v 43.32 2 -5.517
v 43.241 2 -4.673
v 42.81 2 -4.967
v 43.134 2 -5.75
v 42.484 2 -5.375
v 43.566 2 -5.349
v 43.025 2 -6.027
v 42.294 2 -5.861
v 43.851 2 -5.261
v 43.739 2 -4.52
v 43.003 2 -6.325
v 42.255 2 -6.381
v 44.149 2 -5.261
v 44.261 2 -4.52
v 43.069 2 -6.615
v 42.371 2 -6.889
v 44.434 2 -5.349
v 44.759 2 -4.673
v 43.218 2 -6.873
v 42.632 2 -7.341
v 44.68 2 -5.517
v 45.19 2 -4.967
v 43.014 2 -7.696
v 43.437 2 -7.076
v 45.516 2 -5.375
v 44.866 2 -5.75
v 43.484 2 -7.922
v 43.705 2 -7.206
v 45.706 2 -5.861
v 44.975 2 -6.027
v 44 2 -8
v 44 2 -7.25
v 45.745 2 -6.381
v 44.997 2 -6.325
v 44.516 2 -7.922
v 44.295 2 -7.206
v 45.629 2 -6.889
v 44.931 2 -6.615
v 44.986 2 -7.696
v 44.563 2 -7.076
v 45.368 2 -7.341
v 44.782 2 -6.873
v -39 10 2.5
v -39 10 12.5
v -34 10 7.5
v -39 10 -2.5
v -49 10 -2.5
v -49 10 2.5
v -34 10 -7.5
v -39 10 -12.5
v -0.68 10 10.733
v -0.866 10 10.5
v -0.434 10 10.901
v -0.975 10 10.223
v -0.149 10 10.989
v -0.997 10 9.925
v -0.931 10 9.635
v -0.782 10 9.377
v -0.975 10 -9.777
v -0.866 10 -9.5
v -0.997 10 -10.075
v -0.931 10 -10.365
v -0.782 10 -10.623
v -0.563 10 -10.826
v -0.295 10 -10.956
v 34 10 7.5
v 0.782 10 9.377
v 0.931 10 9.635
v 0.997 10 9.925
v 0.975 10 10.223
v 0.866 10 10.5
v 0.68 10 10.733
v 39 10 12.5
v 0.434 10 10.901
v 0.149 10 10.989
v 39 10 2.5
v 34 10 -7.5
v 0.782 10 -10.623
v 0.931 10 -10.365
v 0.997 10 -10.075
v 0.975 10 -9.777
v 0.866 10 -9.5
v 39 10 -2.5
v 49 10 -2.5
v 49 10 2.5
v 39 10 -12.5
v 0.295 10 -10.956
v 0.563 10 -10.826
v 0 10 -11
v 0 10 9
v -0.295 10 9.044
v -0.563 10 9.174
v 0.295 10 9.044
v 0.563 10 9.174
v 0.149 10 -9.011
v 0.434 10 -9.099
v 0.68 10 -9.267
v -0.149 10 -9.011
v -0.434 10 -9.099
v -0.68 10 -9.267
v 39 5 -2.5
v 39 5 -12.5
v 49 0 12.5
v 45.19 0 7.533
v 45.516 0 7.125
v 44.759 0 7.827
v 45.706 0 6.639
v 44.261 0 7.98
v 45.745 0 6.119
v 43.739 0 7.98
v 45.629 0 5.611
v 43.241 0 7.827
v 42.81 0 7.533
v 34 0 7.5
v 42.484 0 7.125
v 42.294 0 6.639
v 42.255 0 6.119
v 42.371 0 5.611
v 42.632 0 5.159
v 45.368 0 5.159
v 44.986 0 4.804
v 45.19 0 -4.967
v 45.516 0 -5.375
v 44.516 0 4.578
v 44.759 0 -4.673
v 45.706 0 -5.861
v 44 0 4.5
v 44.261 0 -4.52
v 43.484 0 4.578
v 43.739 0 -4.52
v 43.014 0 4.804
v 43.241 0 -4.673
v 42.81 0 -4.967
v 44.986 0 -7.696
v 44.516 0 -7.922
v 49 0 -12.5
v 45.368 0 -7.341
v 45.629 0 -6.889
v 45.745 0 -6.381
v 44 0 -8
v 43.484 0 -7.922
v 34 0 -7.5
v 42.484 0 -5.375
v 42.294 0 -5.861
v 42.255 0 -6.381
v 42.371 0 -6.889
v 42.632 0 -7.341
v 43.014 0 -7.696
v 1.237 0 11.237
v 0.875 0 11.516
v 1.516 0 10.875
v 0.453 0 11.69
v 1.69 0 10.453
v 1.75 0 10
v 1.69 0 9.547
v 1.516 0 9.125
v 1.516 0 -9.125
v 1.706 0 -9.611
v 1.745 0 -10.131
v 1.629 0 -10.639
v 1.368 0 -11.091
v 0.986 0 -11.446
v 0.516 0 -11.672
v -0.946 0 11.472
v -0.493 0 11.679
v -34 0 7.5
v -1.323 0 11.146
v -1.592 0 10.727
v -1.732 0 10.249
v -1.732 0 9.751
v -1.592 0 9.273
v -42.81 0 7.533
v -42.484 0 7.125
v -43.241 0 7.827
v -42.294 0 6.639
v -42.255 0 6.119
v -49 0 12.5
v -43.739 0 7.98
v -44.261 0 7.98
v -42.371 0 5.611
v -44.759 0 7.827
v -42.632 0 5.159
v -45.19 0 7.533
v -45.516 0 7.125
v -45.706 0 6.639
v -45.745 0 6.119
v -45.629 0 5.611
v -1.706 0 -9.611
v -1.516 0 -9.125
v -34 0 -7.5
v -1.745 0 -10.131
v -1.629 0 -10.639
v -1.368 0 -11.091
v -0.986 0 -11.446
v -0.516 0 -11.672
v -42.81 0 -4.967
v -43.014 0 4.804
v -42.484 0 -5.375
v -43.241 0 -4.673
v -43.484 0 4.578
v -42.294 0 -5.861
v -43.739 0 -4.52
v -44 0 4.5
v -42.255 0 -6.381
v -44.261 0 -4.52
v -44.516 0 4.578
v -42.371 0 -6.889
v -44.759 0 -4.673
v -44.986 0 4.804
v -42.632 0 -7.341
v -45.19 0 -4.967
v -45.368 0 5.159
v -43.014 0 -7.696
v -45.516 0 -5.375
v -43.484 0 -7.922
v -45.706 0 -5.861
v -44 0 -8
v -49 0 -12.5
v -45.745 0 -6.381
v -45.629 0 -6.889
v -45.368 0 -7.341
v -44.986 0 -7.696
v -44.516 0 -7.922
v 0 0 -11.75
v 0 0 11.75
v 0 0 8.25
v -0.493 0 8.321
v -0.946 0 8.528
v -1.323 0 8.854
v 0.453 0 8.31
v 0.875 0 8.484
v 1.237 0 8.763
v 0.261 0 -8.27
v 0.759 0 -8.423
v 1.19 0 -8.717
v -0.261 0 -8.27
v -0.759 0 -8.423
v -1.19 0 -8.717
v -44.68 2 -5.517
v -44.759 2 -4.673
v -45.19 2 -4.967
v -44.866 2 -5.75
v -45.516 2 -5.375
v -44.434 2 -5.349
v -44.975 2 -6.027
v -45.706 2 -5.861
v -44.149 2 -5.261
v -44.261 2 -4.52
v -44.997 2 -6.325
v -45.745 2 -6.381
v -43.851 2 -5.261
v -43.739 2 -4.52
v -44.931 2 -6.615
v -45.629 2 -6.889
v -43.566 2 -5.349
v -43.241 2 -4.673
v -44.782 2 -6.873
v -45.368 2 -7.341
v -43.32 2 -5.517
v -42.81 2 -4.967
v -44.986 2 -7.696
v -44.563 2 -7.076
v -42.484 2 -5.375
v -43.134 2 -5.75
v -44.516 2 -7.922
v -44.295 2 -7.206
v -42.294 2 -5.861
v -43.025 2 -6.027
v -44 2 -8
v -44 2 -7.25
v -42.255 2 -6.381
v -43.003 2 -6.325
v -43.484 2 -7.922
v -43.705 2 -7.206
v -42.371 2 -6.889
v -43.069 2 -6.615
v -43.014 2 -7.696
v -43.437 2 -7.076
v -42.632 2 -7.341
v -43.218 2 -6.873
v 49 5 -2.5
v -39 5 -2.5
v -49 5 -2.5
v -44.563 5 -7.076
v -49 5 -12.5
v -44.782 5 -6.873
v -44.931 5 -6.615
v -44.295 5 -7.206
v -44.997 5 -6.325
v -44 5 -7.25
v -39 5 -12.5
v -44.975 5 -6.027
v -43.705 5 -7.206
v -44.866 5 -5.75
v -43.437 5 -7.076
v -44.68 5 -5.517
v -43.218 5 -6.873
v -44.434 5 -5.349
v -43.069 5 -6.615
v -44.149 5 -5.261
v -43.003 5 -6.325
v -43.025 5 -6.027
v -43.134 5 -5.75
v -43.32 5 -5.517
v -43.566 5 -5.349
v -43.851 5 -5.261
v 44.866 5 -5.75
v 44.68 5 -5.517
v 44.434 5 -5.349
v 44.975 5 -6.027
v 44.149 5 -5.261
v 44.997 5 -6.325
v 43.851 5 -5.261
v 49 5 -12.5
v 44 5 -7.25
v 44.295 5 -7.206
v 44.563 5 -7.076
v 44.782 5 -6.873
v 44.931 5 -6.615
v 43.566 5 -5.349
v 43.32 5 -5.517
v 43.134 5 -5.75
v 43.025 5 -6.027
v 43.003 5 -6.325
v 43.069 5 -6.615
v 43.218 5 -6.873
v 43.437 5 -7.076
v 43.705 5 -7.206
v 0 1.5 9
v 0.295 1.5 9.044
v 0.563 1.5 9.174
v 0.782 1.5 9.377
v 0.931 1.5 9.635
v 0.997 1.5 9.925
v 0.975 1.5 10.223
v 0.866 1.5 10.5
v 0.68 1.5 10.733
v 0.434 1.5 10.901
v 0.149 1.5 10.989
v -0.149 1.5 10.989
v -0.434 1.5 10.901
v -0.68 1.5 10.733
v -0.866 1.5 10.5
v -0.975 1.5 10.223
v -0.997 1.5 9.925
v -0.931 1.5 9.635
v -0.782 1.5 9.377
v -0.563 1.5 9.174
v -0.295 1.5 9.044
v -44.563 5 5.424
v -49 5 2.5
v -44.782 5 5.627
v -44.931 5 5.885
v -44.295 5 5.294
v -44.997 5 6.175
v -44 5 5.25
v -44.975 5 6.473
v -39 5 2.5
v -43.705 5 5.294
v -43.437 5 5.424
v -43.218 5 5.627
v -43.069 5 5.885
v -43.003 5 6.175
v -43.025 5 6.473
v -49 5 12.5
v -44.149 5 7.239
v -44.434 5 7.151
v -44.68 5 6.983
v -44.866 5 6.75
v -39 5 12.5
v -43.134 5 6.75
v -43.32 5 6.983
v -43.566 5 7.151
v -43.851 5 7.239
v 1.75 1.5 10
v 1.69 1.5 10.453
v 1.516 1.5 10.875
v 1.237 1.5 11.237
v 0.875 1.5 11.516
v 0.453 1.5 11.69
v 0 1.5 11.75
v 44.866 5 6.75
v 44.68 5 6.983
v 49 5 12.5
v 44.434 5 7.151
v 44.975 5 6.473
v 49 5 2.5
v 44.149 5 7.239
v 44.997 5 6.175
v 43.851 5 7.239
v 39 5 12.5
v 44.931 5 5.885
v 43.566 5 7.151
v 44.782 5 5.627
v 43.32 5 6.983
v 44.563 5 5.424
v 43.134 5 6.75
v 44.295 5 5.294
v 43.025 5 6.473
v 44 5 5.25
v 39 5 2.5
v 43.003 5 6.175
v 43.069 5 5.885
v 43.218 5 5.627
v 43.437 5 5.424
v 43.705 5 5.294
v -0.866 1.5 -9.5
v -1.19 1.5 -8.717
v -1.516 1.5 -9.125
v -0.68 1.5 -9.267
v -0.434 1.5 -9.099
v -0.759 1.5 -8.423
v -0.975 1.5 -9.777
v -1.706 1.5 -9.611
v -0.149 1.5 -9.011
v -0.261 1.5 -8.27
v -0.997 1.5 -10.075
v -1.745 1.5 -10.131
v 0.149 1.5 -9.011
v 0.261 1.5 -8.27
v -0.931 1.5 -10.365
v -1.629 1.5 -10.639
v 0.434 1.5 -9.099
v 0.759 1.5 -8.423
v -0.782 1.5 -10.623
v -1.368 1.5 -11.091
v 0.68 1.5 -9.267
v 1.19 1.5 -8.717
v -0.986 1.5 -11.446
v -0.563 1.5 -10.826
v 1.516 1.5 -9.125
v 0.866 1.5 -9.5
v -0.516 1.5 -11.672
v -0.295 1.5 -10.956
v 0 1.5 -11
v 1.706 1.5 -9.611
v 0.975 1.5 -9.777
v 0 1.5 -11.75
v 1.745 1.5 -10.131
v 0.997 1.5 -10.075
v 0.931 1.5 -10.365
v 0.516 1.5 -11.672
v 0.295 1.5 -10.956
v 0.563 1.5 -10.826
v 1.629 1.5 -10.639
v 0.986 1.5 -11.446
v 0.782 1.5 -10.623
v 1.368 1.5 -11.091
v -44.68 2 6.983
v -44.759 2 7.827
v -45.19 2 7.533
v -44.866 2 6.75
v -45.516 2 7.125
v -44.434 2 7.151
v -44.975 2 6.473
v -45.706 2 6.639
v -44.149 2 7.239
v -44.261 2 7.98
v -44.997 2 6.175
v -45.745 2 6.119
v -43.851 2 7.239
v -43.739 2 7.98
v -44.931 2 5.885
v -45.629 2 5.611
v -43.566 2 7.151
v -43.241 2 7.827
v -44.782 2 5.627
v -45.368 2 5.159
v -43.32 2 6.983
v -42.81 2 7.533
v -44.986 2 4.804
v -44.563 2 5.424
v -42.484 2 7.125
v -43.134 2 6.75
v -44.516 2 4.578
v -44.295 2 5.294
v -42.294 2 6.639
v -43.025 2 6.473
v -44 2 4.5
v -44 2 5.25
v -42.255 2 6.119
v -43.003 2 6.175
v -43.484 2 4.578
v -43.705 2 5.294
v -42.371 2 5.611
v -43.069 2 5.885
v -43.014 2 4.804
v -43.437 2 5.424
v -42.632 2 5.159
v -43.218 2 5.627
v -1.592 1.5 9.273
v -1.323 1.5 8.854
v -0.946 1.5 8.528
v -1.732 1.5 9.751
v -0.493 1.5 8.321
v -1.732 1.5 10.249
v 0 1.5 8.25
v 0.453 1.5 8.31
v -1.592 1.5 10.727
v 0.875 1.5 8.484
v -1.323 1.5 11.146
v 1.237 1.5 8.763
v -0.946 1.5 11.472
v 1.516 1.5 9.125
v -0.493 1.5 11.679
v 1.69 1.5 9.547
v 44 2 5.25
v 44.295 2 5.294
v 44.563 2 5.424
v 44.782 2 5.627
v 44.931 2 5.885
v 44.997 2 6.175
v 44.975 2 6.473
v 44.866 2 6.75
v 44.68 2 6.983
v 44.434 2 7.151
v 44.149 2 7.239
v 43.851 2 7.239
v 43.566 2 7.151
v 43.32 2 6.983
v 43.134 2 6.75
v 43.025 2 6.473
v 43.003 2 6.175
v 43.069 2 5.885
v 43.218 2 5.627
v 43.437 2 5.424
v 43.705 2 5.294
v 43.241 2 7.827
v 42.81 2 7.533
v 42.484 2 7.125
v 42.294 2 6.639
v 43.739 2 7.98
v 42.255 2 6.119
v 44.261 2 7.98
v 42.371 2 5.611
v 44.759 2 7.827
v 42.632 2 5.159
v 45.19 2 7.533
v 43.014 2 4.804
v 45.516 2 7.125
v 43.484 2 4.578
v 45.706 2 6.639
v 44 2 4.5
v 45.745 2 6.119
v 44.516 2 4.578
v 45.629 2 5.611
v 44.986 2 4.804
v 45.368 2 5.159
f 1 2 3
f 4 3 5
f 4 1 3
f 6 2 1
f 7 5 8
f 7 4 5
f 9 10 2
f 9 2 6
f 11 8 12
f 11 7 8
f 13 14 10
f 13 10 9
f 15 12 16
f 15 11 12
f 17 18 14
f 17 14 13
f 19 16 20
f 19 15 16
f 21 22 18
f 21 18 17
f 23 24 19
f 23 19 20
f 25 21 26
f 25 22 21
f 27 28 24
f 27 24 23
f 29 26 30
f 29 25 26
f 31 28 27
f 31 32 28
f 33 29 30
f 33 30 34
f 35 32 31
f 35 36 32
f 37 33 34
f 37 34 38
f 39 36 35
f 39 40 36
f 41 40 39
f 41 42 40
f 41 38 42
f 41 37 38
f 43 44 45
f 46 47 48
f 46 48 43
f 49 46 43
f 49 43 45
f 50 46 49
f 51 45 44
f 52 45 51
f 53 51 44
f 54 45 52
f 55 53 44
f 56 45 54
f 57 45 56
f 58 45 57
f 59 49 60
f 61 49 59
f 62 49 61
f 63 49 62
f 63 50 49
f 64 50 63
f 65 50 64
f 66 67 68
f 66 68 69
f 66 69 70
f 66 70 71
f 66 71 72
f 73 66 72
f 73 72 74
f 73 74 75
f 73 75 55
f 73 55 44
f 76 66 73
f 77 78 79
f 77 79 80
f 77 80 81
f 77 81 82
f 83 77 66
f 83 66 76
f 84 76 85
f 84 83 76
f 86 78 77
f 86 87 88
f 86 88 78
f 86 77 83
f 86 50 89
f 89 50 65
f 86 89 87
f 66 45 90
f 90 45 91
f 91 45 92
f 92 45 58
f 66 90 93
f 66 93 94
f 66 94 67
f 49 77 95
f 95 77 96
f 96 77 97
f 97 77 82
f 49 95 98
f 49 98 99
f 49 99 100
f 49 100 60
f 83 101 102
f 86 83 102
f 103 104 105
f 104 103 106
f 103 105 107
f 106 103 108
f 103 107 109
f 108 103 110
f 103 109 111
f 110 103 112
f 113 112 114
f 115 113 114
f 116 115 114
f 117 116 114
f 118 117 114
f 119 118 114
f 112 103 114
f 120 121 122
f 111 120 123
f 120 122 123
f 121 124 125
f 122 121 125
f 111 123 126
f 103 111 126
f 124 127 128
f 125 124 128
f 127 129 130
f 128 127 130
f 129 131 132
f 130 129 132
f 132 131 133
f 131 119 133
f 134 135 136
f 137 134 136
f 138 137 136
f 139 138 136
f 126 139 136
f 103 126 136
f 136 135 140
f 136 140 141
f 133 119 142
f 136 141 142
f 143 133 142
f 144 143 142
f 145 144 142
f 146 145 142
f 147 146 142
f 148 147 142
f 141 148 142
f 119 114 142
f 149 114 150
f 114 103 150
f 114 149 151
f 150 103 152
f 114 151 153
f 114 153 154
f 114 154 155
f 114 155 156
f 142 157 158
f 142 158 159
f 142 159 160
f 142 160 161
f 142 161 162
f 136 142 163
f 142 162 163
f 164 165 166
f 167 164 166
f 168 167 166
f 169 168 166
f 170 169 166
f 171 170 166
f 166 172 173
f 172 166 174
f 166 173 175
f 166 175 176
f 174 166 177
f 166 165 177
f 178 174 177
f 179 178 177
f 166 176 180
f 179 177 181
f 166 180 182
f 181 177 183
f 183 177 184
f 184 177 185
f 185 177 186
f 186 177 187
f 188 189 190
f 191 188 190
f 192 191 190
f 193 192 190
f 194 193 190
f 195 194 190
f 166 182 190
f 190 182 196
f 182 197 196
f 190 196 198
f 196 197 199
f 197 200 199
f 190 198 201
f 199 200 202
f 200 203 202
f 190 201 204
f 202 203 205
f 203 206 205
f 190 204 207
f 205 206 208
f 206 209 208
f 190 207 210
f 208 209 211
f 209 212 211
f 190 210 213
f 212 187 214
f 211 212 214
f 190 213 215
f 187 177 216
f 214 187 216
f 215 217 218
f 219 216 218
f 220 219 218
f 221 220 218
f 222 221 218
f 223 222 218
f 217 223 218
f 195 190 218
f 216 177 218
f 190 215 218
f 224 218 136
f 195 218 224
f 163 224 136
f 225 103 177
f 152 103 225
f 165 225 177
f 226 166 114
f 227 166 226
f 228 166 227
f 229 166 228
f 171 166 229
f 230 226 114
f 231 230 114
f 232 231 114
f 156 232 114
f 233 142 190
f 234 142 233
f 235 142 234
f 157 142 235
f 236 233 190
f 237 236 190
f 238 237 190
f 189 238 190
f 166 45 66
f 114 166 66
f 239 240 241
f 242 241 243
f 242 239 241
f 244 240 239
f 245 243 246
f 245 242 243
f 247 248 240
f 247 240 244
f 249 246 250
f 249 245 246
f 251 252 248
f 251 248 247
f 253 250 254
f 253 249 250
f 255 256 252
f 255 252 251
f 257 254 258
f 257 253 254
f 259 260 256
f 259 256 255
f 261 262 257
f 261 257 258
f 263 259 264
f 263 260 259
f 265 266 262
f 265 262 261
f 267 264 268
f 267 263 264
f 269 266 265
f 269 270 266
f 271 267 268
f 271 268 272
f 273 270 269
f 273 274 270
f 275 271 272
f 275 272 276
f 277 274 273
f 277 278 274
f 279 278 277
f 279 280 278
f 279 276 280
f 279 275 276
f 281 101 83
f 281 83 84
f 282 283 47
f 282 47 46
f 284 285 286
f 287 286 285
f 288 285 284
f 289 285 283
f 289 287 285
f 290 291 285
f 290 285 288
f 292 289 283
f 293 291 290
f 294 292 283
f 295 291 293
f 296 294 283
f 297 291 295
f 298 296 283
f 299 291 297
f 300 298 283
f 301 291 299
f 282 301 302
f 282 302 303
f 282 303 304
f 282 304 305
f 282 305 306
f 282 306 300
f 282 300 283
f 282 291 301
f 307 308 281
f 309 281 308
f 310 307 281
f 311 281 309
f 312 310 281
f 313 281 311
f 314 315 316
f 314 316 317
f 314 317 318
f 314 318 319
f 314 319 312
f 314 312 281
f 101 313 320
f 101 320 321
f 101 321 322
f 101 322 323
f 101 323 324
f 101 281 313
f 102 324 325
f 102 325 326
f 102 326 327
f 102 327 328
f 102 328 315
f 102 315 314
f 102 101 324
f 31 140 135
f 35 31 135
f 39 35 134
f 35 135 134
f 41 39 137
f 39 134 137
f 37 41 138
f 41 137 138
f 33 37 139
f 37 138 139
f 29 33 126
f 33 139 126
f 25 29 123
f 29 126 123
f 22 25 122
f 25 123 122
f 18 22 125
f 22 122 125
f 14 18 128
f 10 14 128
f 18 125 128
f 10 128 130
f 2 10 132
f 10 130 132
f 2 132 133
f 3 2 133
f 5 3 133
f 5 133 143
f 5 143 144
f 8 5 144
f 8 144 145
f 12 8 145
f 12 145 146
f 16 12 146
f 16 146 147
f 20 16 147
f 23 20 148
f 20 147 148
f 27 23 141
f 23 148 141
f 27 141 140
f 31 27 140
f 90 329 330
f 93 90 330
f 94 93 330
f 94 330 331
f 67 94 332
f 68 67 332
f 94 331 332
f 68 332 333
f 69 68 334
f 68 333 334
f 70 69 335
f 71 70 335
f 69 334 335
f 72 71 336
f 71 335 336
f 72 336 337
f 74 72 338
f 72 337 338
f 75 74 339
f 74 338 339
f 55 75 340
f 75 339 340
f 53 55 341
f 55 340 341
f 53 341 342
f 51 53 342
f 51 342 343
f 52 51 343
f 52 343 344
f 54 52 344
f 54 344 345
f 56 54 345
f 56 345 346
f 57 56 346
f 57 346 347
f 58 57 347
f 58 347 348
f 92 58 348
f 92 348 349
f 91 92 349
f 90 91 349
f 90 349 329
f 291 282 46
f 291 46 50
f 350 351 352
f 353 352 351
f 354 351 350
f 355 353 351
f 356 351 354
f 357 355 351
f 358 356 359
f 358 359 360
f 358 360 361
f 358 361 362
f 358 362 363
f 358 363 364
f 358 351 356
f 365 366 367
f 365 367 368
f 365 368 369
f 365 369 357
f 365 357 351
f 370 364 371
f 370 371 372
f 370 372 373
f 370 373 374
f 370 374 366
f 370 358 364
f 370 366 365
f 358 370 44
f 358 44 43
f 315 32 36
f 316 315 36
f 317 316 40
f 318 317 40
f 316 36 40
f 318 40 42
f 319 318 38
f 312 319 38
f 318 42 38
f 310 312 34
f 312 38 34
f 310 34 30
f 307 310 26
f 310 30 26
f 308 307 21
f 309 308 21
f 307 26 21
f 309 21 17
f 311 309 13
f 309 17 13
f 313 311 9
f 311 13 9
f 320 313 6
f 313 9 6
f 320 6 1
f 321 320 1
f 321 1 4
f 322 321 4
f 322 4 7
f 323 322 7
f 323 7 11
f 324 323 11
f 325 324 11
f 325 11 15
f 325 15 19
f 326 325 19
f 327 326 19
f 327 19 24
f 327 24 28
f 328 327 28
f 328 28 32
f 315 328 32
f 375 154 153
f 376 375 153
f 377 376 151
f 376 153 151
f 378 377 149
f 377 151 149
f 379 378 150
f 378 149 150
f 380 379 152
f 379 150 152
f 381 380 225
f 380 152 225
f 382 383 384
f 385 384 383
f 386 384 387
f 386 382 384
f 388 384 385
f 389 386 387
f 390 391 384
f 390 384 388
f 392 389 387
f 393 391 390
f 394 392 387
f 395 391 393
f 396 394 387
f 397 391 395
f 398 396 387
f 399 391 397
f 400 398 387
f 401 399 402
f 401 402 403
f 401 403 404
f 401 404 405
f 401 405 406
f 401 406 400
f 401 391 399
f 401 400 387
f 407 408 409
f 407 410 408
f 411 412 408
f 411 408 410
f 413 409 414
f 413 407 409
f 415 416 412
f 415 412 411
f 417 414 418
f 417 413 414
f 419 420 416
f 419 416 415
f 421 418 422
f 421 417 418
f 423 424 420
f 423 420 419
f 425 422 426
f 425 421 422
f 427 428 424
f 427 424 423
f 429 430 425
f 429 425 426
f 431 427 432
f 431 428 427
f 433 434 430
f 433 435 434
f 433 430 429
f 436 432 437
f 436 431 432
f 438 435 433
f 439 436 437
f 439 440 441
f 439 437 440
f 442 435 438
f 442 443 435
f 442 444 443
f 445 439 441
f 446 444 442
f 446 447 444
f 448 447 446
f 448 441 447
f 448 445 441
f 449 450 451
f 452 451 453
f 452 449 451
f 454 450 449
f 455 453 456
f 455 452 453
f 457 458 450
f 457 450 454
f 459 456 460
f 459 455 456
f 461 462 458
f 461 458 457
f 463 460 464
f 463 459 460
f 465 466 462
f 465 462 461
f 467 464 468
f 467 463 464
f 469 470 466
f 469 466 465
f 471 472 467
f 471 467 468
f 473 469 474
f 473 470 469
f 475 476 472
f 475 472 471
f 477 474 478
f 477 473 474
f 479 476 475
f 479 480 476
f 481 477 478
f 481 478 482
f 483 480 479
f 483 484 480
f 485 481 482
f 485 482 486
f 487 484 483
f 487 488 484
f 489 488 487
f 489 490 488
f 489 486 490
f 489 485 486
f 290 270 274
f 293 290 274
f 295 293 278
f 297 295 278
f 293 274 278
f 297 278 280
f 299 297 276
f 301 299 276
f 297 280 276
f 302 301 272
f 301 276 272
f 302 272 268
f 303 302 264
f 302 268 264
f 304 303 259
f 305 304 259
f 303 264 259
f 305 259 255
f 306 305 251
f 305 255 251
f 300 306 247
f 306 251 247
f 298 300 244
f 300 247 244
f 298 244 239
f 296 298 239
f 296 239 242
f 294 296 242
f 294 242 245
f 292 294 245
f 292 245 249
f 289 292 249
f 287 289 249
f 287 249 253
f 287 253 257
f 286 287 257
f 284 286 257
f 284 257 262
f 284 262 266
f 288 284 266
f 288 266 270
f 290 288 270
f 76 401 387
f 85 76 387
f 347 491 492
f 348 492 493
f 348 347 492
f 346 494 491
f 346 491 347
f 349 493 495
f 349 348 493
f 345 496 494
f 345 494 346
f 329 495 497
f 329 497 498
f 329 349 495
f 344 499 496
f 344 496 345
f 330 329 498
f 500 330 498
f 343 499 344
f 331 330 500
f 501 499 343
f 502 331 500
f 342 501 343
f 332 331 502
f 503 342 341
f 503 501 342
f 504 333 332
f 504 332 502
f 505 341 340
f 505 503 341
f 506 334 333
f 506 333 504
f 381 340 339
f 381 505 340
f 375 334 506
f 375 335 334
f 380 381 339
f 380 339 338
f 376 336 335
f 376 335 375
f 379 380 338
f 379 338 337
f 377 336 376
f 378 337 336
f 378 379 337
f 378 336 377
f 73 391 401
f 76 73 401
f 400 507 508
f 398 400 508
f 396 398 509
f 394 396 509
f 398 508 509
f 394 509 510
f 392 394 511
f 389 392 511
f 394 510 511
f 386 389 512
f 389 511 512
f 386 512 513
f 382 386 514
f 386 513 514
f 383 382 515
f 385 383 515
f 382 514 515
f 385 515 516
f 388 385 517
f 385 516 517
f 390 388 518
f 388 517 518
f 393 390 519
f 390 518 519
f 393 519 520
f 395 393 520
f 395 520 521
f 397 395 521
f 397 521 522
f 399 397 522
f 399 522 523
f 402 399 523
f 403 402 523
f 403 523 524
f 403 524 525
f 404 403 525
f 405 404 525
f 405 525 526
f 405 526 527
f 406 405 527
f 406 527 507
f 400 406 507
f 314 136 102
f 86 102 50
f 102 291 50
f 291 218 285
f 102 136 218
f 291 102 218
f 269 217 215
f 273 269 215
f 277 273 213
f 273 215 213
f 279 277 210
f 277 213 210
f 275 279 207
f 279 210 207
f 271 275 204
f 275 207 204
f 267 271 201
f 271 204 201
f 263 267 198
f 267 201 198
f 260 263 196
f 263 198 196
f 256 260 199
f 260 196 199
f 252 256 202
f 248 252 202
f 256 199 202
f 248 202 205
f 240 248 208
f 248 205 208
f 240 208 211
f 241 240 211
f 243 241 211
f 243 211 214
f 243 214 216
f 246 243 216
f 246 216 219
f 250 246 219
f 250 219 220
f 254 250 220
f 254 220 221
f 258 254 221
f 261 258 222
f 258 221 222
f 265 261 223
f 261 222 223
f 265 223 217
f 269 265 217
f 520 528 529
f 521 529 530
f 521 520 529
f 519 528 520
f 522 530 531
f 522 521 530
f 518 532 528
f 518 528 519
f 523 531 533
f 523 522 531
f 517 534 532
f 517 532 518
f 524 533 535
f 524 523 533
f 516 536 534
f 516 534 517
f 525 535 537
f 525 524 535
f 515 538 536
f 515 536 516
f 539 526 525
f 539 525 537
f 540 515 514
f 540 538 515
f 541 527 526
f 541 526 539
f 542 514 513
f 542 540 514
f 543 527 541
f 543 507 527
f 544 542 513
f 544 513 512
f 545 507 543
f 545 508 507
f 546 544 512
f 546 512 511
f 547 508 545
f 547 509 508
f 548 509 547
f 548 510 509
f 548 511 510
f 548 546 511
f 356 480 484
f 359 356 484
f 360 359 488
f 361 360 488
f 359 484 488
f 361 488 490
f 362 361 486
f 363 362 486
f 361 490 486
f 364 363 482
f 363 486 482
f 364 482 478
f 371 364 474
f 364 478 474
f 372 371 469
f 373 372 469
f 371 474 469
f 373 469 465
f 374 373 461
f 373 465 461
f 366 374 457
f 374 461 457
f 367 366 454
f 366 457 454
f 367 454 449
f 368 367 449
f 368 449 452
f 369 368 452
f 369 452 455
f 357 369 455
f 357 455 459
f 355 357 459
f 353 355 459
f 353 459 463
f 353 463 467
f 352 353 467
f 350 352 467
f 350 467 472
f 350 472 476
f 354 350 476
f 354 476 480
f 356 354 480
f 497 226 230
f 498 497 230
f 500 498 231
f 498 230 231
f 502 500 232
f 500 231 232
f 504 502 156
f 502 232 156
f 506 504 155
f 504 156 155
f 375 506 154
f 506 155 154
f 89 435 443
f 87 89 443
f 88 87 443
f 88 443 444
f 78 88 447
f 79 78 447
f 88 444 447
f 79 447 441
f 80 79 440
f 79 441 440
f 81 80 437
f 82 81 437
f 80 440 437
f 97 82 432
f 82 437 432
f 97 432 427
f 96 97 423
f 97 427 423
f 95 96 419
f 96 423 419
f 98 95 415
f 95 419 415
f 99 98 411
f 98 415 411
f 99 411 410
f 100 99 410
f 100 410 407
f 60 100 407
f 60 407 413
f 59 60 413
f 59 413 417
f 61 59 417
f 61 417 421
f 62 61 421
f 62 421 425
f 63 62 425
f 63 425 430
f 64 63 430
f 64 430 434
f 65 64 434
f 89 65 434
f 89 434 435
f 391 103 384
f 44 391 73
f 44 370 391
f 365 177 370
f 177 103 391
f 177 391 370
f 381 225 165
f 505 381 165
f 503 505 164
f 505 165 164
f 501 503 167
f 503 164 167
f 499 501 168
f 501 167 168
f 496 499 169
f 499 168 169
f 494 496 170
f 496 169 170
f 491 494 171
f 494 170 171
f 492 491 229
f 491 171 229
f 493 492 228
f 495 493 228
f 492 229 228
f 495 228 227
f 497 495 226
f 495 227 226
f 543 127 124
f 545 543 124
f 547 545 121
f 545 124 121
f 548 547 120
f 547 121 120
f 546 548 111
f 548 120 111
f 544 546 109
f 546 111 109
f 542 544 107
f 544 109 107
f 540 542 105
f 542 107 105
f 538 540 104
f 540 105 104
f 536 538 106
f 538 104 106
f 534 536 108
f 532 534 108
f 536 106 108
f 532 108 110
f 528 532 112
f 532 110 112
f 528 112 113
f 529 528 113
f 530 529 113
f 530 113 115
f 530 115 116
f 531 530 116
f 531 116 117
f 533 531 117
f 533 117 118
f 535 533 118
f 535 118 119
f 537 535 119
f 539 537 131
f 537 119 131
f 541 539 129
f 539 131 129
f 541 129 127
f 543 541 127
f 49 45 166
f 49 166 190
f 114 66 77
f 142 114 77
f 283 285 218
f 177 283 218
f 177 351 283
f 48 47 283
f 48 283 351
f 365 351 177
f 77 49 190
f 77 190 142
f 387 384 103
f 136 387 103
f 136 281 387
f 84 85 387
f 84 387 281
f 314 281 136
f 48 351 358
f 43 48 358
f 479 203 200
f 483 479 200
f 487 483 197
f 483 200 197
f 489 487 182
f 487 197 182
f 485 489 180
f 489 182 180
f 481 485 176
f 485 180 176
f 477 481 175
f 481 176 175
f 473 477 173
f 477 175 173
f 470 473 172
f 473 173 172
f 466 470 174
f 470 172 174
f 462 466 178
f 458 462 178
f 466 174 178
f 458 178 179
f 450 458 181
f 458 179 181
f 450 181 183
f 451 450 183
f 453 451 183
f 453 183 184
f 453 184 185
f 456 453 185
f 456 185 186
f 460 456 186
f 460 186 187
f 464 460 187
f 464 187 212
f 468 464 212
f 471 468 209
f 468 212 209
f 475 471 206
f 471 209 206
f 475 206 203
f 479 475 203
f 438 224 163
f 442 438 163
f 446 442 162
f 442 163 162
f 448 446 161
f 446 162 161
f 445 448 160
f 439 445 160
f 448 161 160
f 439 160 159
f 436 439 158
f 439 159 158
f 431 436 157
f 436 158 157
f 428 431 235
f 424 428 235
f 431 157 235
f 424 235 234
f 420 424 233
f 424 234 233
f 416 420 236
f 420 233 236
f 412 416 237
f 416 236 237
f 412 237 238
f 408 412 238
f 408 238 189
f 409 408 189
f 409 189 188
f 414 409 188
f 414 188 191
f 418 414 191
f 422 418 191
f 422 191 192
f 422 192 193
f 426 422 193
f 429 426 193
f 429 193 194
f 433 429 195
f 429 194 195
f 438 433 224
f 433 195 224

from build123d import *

# Parameters (mm, degrees)
SKETCH1_W           = 78
SKETCH1_H           = 25
BOSS_EXTRUDE1_DEPTH = 10
SKETCH2_W           = 68
SKETCH2_H           = 15
CUT_EXTRUDE2_DEPTH  = 10
SKETCH3_W           = 25
SKETCH3_H           = 5
BOSS_EXTRUDE2_DEPTH = 10
SKETCH4_W           = 25
SKETCH4_H           = 5
BOSS_EXTRUDE3_DEPTH = 10
SKETCH6_W           = 10
SKETCH6_H           = 5
BOSS_EXTRUDE4_DEPTH = 5
SKETCH9_R           = 1.75
CUT_EXTRUDE5_DEPTH  = 2
SKETCH10_R          = 1
CUT_EXTRUDE6_DEPTH  = 13
CUT_EXTRUDE7_DEPTH  = 1.5
SKETCH12_R          = 1
CUT_EXTRUDE8_DEPTH  = 10.5
SKETCH13_R          = 1
CUT_EXTRUDE9_DEPTH  = 15
SKETCH14_R          = 1.75
CUT_EXTRUDE11_DEPTH = 1.5


with BuildPart() as part:
    # Sketch1 → Boss-Extrude1 (new body)
    with BuildSketch(Plane(origin=(0, 0, 0), x_dir=(1, 0, 0), z_dir=(0, 1, 0))):
        Rectangle(SKETCH1_W, SKETCH1_H)
    extrude(amount=BOSS_EXTRUDE1_DEPTH)

    # Sketch2 → Cut-Extrude2 (cut)
    with BuildSketch(Plane(origin=(0, 10, 0), x_dir=(1, 0, 0), z_dir=(0, 1, 0))):
        Rectangle(SKETCH2_W, SKETCH2_H)
    extrude(amount=-CUT_EXTRUDE2_DEPTH, mode=Mode.SUBTRACT)

    # Sketch3 → Boss-Extrude2 (add)
    with BuildSketch(Plane.ZY.offset(39)):
        with Locations((0, 2.5)):
            Rectangle(SKETCH3_W, SKETCH3_H)
    extrude(amount=BOSS_EXTRUDE2_DEPTH)

    # Sketch4 → Boss-Extrude3 (add)
    with BuildSketch(Plane(origin=(39, 0, 0), x_dir=(0, 0, -1), z_dir=(1, 0, 0))):
        with Locations((0, 2.5)):
            Rectangle(SKETCH4_W, SKETCH4_H)
    extrude(amount=BOSS_EXTRUDE3_DEPTH)

    # Sketch6 → Boss-Extrude4 (add)
    with BuildSketch(Plane(origin=(0, 5, 0), x_dir=(1, 0, 0), z_dir=(0, 1, 0))):
        with Locations((44, 0)):
            Rectangle(SKETCH6_W, SKETCH6_H)
        with Locations((-44, 0)):
            Rectangle(SKETCH6_W, SKETCH6_H)
    extrude(amount=BOSS_EXTRUDE4_DEPTH)

    # Sketch9 → Cut-Extrude5 (cut)
    with BuildSketch(Plane.XZ):
        with Locations(Location((-44, 6.25, 0), (0, 0, 270))):
            Circle(SKETCH9_R)
        with Locations(Location((-44, -6.25, 0), (0, 0, 270))):
            Circle(SKETCH9_R)
        with Locations(Location((44, 6.25, 0), (0, 0, 270))):
            Circle(SKETCH9_R)
        with Locations(Location((44, -6.25, 0), (0, 0, 270))):
            Circle(SKETCH9_R)
    extrude(amount=-CUT_EXTRUDE5_DEPTH, mode=Mode.SUBTRACT)

    # Sketch10 → Cut-Extrude6 (cut)
    with BuildSketch(Plane.XZ.offset(-2)):
        with Locations(Location((-44, 6.25, 0), (0, 0, 270))):
            Circle(SKETCH10_R)
        with Locations(Location((-44, -6.25, 0), (0, 0, 270))):
            Circle(SKETCH10_R)
        with Locations(Location((44, 6.25, 0), (0, 0, 270))):
            Circle(SKETCH10_R)
        with Locations(Location((44, -6.25, 0), (0, 0, 270))):
            Circle(SKETCH10_R)
    extrude(amount=-CUT_EXTRUDE6_DEPTH, mode=Mode.SUBTRACT)

    # Sketch11 → Cut-Extrude7 (cut)
    with BuildSketch(Plane.XZ):
        with BuildLine():
            ThreePointArc((0, 11.75), (-1.75, 10), (0, 8.25))
            Line((0, 8.25), (0, 11.75))
        make_face()
        with BuildLine():
            Line((0, 11.75), (0, 8.25))
            ThreePointArc((0, 8.25), (1.237436867, 8.762563133), (1.75, 10))
            ThreePointArc((1.75, 10), (1.237436867, 11.237436867), (0, 11.75))
        make_face()
    extrude(amount=-CUT_EXTRUDE7_DEPTH, mode=Mode.SUBTRACT)

    # Sketch12 → Cut-Extrude8 (cut)
    with BuildSketch(Plane.XZ.offset(-1.5)):
        with Locations(Location((0, 10, 0), (0, 0, 270))):
            Circle(SKETCH12_R)
    extrude(amount=-CUT_EXTRUDE8_DEPTH, mode=Mode.SUBTRACT)

    # Sketch13 → Cut-Extrude9 (cut)
    with BuildSketch(Plane.XZ):
        with Locations(Location((0, -10, 0), (0, 0, 270))):
            Circle(SKETCH13_R)
    extrude(amount=-CUT_EXTRUDE9_DEPTH, mode=Mode.SUBTRACT)

    # Sketch14 → Cut-Extrude11 (cut)
    with BuildSketch(Plane.XZ):
        with Locations(Location((0, -10, 0), (0, 0, 270))):
            Circle(SKETCH14_R)
    extrude(amount=-CUT_EXTRUDE11_DEPTH, mode=Mode.SUBTRACT)


solid = part.part
